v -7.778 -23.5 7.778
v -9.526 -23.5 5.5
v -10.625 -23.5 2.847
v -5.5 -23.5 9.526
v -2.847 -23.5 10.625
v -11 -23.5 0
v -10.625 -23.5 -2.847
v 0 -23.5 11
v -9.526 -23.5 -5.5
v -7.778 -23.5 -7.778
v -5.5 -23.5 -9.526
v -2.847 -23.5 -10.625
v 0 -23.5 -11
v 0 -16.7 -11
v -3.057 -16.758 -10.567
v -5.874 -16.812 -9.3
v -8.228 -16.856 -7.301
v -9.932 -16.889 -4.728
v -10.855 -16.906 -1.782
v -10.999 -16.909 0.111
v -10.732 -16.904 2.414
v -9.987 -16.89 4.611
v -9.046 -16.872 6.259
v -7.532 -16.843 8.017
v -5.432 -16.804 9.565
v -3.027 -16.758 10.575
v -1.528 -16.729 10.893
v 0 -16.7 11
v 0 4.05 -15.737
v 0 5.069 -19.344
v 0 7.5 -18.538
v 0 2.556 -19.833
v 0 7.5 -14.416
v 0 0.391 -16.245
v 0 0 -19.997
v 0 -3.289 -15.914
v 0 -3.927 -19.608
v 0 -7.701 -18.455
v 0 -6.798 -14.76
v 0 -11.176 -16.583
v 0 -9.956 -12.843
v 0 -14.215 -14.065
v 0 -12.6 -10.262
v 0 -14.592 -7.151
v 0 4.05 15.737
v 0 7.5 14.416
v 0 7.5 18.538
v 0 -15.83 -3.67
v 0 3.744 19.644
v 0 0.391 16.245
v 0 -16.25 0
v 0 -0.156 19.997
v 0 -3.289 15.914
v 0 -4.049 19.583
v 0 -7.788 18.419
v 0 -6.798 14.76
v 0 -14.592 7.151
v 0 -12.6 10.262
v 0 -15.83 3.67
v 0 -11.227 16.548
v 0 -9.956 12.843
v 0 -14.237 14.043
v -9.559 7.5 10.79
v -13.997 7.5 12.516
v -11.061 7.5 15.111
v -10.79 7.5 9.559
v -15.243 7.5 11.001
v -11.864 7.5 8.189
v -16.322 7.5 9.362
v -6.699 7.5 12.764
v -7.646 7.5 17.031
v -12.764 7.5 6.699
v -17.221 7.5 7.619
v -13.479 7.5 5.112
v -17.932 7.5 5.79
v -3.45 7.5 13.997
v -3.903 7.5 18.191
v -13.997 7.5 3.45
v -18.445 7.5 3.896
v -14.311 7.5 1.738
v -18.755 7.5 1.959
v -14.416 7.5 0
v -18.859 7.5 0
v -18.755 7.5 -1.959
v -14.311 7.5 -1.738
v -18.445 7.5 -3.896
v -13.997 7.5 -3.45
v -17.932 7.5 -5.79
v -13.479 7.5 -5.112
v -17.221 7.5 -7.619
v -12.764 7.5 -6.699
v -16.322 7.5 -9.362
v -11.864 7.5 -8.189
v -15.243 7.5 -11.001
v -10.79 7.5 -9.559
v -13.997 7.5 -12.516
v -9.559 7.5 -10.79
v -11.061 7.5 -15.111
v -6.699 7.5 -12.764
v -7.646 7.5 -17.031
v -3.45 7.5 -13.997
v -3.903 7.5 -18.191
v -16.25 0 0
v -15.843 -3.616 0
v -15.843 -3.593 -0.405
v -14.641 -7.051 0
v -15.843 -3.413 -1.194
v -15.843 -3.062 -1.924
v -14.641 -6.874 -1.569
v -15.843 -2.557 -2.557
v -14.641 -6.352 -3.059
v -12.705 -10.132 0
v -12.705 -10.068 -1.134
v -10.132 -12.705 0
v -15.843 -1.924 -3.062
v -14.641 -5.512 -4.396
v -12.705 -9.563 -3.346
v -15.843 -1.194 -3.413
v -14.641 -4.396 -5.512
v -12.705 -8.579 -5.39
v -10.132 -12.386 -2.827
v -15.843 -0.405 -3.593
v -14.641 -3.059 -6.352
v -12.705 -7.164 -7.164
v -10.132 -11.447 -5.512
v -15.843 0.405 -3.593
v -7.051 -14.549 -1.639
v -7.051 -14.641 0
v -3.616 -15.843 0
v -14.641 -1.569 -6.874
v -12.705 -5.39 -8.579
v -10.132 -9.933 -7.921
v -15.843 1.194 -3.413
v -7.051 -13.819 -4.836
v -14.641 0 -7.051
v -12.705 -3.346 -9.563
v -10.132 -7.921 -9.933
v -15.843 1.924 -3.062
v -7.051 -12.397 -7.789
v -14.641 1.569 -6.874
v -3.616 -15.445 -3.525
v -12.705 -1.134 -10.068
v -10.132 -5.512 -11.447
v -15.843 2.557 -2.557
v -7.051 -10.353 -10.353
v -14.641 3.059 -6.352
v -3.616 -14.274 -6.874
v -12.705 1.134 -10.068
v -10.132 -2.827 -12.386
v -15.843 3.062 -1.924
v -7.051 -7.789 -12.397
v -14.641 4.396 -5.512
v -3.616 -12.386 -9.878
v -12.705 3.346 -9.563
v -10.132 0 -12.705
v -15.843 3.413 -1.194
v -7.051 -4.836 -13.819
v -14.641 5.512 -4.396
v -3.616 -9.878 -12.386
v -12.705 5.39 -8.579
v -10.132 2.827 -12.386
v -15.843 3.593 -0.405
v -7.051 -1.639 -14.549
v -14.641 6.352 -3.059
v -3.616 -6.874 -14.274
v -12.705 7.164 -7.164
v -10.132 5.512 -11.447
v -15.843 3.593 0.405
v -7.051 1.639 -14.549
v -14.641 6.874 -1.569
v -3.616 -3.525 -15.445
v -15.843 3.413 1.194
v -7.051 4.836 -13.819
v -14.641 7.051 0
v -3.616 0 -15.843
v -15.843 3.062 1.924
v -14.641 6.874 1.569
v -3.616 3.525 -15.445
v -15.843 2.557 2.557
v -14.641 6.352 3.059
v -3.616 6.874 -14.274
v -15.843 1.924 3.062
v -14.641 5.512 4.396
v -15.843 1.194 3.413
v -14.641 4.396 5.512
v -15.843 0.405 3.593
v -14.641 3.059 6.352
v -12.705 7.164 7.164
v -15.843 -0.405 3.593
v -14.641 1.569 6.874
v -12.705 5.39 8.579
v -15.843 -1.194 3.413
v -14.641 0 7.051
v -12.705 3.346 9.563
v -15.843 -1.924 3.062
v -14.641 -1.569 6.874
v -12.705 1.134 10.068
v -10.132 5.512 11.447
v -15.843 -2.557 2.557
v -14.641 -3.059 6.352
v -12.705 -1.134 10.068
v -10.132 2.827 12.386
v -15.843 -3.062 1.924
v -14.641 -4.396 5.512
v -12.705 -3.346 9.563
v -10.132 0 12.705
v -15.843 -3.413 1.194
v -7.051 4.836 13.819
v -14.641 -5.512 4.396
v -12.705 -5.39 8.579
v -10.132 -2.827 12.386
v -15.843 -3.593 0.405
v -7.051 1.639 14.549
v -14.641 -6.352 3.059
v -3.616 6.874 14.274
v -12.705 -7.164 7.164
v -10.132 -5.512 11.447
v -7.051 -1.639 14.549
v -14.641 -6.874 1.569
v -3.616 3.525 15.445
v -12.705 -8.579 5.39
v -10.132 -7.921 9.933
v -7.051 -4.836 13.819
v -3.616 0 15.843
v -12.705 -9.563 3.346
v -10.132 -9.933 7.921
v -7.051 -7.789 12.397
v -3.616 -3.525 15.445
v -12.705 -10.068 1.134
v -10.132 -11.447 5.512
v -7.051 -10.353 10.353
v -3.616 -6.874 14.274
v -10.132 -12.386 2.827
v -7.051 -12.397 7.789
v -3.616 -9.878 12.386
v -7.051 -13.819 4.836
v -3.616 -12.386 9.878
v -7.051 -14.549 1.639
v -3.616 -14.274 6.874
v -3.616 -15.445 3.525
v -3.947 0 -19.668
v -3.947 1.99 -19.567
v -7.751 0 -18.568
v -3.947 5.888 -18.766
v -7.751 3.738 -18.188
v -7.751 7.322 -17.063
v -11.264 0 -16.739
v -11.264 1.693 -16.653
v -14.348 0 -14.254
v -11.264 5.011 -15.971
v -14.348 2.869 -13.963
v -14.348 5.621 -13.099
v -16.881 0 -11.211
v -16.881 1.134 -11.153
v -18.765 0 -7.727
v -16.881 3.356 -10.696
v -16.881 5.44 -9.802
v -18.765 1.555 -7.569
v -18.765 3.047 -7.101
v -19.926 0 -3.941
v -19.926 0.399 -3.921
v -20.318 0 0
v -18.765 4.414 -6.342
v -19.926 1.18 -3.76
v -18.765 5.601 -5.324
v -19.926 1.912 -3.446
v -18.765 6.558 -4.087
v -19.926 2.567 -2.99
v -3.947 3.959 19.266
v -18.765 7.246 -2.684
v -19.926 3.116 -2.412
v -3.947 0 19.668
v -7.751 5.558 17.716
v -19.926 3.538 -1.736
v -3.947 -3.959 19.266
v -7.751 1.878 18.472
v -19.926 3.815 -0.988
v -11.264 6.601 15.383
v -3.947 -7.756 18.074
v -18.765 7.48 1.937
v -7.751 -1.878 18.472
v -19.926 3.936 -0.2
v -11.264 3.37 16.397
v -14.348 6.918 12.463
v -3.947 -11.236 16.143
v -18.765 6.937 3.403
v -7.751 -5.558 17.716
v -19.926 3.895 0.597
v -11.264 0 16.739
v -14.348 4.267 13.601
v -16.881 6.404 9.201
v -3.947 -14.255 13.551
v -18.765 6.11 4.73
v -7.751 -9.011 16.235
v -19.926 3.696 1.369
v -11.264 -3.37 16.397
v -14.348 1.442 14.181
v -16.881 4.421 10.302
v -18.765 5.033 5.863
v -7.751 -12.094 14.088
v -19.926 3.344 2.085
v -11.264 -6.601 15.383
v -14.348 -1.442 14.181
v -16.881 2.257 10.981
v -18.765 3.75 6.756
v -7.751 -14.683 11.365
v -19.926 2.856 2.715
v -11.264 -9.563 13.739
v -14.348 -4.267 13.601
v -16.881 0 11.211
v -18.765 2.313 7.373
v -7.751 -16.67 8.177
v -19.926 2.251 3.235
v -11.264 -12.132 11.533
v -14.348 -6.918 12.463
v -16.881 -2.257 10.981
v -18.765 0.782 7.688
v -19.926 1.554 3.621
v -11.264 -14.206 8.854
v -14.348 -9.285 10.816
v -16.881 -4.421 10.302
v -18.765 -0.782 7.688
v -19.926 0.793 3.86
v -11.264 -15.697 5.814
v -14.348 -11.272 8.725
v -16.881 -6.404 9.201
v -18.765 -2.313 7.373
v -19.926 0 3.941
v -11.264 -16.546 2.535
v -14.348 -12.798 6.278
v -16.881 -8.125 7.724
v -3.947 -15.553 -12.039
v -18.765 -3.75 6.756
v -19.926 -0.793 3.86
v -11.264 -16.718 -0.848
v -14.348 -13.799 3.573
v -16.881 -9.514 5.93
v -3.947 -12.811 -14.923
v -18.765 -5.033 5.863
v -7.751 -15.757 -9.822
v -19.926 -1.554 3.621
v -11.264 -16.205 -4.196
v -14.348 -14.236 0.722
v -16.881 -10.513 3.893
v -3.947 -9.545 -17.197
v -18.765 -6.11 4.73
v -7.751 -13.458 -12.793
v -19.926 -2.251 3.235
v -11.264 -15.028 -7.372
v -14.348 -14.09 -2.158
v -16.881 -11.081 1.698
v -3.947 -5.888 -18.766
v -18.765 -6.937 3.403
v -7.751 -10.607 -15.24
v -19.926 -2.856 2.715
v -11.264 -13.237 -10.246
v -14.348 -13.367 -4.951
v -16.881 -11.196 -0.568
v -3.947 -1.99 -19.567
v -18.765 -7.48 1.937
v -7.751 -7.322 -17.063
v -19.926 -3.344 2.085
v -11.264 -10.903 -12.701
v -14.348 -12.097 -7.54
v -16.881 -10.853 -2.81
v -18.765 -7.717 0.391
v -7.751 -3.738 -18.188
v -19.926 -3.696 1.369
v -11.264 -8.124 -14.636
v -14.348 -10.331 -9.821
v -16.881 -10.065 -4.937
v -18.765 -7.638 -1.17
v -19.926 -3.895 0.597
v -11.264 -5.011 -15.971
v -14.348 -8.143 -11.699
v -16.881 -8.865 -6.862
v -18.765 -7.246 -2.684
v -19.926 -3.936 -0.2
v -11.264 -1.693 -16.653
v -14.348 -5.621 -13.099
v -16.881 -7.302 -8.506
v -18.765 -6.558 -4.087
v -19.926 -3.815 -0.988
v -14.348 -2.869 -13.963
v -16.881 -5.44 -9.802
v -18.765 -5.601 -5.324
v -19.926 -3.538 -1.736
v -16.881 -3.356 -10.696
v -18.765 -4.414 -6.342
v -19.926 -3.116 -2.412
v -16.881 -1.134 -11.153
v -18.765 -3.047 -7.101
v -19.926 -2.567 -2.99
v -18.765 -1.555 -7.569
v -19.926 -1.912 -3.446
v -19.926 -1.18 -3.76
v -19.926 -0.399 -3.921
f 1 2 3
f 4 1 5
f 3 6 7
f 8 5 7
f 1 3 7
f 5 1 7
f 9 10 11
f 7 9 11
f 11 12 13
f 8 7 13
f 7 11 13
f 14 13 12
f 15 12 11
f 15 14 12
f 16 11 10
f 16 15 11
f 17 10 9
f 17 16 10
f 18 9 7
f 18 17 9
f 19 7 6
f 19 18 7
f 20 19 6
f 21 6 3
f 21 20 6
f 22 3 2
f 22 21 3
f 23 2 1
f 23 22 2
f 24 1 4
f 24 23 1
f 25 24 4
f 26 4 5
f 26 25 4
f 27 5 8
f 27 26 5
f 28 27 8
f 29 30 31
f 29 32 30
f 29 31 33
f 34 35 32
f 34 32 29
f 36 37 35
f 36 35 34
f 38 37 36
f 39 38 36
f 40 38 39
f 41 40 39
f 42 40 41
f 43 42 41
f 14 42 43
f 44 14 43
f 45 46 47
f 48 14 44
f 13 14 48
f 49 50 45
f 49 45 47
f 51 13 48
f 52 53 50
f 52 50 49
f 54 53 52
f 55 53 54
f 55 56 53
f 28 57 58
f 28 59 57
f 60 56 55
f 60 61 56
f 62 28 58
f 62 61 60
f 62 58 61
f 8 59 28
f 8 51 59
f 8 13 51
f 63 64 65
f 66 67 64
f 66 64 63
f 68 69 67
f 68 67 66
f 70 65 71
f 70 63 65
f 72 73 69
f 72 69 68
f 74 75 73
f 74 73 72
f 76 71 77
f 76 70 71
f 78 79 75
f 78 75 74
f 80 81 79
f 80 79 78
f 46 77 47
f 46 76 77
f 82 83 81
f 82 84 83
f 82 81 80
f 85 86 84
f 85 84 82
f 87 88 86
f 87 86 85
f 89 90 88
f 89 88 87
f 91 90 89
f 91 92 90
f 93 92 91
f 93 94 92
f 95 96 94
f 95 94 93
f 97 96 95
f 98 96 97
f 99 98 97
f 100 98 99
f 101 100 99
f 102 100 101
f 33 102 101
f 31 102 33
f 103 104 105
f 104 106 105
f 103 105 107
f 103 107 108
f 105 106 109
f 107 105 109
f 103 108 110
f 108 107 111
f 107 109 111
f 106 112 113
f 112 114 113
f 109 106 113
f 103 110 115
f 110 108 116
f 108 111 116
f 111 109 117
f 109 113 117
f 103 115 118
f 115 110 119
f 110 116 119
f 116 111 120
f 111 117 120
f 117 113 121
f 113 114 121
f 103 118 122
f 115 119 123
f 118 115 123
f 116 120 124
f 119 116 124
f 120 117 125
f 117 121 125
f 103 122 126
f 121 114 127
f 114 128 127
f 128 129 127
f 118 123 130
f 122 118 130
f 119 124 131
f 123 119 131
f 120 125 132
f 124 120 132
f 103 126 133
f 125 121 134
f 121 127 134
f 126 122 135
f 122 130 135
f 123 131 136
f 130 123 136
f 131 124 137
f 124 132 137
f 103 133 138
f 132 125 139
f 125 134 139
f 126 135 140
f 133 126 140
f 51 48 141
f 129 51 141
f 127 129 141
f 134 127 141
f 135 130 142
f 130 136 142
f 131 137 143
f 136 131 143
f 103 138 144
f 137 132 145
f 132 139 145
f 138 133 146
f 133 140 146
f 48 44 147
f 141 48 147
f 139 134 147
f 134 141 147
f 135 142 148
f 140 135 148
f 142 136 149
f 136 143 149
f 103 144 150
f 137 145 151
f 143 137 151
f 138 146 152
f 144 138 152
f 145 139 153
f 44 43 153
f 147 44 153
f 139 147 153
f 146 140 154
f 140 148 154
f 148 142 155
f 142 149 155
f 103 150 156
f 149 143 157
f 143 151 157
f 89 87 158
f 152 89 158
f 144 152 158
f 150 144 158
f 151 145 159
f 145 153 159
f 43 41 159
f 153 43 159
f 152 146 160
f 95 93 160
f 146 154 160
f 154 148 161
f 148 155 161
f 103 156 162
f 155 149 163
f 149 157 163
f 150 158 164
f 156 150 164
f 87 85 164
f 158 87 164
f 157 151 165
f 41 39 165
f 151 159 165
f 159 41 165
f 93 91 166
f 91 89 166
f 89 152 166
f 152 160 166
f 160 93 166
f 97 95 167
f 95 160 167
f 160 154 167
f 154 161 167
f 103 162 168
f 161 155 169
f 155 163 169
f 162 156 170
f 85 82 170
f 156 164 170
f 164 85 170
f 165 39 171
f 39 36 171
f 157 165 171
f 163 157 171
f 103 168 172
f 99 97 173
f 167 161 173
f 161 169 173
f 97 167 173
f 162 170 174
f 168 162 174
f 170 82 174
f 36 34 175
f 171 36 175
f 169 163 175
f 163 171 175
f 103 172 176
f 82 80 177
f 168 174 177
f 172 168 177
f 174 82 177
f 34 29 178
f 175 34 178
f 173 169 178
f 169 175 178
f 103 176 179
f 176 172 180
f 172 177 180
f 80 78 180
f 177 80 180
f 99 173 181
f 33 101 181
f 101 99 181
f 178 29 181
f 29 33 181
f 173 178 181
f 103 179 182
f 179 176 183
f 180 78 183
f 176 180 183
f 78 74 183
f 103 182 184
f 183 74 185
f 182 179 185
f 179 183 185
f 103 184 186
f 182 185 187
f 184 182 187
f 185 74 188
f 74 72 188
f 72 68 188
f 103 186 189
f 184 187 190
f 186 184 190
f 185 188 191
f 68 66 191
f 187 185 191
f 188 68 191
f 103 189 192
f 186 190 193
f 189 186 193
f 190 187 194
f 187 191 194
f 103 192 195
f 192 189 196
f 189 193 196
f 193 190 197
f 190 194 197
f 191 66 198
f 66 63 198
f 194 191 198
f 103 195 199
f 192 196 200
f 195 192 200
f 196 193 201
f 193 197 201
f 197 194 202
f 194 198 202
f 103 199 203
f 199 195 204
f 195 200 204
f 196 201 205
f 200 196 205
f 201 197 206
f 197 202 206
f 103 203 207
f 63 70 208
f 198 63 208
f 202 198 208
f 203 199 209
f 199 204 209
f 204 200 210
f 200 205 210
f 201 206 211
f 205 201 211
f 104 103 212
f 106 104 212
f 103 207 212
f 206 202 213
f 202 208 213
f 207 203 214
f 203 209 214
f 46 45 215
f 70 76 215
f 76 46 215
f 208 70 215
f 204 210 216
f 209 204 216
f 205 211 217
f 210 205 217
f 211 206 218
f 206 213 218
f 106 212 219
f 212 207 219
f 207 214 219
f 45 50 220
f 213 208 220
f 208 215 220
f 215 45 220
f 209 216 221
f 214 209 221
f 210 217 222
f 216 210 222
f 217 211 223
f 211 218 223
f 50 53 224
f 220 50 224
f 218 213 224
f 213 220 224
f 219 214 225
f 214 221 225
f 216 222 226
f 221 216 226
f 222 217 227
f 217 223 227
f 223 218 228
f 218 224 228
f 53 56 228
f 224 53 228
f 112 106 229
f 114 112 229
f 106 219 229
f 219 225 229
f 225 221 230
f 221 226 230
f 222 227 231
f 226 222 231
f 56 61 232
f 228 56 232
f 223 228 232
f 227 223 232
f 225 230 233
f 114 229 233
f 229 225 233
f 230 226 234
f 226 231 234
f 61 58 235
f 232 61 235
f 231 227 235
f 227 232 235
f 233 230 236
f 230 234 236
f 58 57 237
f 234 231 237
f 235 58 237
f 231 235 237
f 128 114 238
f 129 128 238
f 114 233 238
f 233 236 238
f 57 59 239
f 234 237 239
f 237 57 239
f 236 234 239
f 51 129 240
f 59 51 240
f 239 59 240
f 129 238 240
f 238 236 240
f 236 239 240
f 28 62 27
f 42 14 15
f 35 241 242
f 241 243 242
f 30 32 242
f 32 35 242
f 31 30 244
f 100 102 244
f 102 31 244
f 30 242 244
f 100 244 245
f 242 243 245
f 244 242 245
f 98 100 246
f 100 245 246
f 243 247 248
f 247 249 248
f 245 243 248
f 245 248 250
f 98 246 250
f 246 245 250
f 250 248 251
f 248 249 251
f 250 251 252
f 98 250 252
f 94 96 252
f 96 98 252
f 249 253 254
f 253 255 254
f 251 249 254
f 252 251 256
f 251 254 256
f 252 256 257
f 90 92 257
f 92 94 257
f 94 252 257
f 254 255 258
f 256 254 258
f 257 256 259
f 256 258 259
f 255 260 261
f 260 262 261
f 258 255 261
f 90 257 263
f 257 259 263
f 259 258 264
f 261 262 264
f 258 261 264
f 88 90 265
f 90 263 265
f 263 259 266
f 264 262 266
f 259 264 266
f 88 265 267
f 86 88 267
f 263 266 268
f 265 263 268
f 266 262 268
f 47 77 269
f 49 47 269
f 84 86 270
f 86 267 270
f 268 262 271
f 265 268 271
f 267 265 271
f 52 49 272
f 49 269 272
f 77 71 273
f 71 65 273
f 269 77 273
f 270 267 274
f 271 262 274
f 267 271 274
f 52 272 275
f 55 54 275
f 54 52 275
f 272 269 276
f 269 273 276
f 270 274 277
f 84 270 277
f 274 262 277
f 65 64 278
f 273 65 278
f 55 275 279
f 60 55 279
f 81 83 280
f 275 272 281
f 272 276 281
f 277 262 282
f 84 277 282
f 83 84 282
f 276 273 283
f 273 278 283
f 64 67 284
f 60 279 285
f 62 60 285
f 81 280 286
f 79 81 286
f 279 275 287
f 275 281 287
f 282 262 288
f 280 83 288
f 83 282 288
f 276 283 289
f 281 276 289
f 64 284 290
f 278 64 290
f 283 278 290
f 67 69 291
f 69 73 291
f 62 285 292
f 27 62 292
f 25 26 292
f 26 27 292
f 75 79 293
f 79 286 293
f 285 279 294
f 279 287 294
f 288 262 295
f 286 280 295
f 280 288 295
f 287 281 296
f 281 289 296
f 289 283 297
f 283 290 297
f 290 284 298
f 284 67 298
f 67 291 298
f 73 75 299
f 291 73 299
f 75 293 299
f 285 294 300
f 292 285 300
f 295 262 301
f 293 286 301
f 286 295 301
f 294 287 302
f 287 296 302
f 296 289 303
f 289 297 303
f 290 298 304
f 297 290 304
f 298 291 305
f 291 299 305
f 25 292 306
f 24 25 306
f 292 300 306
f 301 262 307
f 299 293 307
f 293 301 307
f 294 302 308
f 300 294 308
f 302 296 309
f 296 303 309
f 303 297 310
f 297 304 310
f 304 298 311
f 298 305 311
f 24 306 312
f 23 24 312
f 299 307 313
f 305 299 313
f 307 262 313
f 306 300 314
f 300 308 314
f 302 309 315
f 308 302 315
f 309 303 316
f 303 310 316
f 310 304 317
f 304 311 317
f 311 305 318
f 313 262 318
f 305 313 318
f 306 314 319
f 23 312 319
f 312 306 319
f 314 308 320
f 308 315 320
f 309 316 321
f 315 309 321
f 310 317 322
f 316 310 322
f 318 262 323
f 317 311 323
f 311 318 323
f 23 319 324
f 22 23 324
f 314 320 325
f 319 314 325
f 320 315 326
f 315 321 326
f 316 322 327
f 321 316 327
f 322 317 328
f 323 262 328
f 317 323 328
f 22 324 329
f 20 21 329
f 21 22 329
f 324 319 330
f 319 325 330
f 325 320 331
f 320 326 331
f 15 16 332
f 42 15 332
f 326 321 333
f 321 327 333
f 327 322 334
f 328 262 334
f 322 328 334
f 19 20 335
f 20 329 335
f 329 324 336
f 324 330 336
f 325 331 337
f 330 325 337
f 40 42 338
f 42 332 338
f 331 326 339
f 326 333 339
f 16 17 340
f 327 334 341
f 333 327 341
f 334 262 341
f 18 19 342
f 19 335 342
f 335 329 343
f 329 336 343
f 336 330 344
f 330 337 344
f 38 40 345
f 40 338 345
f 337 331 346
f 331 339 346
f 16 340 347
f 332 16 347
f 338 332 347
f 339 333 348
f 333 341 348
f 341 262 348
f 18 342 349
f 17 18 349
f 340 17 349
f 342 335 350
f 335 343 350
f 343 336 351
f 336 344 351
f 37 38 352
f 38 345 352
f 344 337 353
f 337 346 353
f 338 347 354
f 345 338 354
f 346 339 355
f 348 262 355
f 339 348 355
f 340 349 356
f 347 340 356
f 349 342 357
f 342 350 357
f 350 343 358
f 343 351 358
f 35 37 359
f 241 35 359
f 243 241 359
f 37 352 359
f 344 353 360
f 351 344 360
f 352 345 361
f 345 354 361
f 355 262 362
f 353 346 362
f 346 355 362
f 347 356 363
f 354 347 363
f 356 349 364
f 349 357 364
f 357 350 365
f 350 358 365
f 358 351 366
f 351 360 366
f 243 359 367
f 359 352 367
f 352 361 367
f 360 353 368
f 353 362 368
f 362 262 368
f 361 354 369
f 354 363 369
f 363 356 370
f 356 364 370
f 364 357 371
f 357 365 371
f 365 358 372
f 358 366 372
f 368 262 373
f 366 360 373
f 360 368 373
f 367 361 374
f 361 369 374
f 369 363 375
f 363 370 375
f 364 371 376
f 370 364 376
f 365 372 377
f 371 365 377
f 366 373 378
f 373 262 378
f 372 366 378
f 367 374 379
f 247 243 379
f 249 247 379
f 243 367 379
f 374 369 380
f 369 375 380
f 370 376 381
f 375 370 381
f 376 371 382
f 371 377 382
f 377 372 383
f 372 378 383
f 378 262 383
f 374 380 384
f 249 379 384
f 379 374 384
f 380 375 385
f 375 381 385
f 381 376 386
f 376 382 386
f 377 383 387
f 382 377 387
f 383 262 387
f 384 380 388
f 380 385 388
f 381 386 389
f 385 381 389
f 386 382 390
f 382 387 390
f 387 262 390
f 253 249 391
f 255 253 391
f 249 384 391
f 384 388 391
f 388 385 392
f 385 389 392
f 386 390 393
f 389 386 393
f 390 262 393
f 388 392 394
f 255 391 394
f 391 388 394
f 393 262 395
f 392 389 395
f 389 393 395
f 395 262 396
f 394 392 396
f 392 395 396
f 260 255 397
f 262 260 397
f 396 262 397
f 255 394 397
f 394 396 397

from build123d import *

# Parameters (mm, degrees)
SKETCH2_W           = 42
SKETCH2_H           = 42
CUT_EXTRUDE1_DEPTH  = 20
SKETCH4_R           = 11
BOSS_EXTRUDE1_DEPTH = 3.5
SKETCH5_W           = 37.942079283
SKETCH5_H           = 42.029174216
CUT_EXTRUDE2_DEPTH  = 40


with BuildPart() as part:
    # Sketch1 → Revolve2 (revolve)
    with BuildSketch(Plane(origin=(0, 0, 0), x_dir=(1, 0, 0), z_dir=(0, 1, 0))):
        with BuildLine():
            Line((-20.31846942, 0), (19.68153058, 0))
            ThreePointArc((19.68153058, 0), (-0.31846942, 20), (-20.31846942, 0))
        make_face()
    revolve(axis=Axis((-66.656056584, 0, 0), (1, 0, 0)))

    # Sketch2 → Cut-Extrude1 (cut)
    with BuildSketch(Plane(origin=(0, 7.5, 0), x_dir=(1, 0, 0), z_dir=(0, 1, 0))):
        Rectangle(SKETCH2_W, SKETCH2_H)
    extrude(amount=CUT_EXTRUDE1_DEPTH, mode=Mode.SUBTRACT)

    # Sketch3 → Cut-Revolve1 (revolve, cut)
    with BuildSketch(Plane.XY):
        with BuildLine():
            Line((16.25, 0), (-16.25, 0))
            ThreePointArc((-16.25, 0), (0, -16.25), (16.25, 0))
        make_face()
    revolve(axis=Axis((-20.31846942, 0, 0), (1, 0, 0)), mode=Mode.SUBTRACT)

    # Sketch4 → Boss-Extrude1 (add, symmetric)
    with BuildSketch(Plane(origin=(0, -20, 0), x_dir=(1, 0, 0), z_dir=(0, 1, 0))):
        Circle(SKETCH4_R)
    extrude(amount=BOSS_EXTRUDE1_DEPTH, both=True)

    # Sketch5 → Cut-Extrude2 (cut)
    with BuildSketch(Plane.XZ.offset(23.5)):
        with Locations((18.971039642, 0)):
            Rectangle(SKETCH5_W, SKETCH5_H)
    extrude(amount=-CUT_EXTRUDE2_DEPTH, mode=Mode.SUBTRACT)


solid = part.part
